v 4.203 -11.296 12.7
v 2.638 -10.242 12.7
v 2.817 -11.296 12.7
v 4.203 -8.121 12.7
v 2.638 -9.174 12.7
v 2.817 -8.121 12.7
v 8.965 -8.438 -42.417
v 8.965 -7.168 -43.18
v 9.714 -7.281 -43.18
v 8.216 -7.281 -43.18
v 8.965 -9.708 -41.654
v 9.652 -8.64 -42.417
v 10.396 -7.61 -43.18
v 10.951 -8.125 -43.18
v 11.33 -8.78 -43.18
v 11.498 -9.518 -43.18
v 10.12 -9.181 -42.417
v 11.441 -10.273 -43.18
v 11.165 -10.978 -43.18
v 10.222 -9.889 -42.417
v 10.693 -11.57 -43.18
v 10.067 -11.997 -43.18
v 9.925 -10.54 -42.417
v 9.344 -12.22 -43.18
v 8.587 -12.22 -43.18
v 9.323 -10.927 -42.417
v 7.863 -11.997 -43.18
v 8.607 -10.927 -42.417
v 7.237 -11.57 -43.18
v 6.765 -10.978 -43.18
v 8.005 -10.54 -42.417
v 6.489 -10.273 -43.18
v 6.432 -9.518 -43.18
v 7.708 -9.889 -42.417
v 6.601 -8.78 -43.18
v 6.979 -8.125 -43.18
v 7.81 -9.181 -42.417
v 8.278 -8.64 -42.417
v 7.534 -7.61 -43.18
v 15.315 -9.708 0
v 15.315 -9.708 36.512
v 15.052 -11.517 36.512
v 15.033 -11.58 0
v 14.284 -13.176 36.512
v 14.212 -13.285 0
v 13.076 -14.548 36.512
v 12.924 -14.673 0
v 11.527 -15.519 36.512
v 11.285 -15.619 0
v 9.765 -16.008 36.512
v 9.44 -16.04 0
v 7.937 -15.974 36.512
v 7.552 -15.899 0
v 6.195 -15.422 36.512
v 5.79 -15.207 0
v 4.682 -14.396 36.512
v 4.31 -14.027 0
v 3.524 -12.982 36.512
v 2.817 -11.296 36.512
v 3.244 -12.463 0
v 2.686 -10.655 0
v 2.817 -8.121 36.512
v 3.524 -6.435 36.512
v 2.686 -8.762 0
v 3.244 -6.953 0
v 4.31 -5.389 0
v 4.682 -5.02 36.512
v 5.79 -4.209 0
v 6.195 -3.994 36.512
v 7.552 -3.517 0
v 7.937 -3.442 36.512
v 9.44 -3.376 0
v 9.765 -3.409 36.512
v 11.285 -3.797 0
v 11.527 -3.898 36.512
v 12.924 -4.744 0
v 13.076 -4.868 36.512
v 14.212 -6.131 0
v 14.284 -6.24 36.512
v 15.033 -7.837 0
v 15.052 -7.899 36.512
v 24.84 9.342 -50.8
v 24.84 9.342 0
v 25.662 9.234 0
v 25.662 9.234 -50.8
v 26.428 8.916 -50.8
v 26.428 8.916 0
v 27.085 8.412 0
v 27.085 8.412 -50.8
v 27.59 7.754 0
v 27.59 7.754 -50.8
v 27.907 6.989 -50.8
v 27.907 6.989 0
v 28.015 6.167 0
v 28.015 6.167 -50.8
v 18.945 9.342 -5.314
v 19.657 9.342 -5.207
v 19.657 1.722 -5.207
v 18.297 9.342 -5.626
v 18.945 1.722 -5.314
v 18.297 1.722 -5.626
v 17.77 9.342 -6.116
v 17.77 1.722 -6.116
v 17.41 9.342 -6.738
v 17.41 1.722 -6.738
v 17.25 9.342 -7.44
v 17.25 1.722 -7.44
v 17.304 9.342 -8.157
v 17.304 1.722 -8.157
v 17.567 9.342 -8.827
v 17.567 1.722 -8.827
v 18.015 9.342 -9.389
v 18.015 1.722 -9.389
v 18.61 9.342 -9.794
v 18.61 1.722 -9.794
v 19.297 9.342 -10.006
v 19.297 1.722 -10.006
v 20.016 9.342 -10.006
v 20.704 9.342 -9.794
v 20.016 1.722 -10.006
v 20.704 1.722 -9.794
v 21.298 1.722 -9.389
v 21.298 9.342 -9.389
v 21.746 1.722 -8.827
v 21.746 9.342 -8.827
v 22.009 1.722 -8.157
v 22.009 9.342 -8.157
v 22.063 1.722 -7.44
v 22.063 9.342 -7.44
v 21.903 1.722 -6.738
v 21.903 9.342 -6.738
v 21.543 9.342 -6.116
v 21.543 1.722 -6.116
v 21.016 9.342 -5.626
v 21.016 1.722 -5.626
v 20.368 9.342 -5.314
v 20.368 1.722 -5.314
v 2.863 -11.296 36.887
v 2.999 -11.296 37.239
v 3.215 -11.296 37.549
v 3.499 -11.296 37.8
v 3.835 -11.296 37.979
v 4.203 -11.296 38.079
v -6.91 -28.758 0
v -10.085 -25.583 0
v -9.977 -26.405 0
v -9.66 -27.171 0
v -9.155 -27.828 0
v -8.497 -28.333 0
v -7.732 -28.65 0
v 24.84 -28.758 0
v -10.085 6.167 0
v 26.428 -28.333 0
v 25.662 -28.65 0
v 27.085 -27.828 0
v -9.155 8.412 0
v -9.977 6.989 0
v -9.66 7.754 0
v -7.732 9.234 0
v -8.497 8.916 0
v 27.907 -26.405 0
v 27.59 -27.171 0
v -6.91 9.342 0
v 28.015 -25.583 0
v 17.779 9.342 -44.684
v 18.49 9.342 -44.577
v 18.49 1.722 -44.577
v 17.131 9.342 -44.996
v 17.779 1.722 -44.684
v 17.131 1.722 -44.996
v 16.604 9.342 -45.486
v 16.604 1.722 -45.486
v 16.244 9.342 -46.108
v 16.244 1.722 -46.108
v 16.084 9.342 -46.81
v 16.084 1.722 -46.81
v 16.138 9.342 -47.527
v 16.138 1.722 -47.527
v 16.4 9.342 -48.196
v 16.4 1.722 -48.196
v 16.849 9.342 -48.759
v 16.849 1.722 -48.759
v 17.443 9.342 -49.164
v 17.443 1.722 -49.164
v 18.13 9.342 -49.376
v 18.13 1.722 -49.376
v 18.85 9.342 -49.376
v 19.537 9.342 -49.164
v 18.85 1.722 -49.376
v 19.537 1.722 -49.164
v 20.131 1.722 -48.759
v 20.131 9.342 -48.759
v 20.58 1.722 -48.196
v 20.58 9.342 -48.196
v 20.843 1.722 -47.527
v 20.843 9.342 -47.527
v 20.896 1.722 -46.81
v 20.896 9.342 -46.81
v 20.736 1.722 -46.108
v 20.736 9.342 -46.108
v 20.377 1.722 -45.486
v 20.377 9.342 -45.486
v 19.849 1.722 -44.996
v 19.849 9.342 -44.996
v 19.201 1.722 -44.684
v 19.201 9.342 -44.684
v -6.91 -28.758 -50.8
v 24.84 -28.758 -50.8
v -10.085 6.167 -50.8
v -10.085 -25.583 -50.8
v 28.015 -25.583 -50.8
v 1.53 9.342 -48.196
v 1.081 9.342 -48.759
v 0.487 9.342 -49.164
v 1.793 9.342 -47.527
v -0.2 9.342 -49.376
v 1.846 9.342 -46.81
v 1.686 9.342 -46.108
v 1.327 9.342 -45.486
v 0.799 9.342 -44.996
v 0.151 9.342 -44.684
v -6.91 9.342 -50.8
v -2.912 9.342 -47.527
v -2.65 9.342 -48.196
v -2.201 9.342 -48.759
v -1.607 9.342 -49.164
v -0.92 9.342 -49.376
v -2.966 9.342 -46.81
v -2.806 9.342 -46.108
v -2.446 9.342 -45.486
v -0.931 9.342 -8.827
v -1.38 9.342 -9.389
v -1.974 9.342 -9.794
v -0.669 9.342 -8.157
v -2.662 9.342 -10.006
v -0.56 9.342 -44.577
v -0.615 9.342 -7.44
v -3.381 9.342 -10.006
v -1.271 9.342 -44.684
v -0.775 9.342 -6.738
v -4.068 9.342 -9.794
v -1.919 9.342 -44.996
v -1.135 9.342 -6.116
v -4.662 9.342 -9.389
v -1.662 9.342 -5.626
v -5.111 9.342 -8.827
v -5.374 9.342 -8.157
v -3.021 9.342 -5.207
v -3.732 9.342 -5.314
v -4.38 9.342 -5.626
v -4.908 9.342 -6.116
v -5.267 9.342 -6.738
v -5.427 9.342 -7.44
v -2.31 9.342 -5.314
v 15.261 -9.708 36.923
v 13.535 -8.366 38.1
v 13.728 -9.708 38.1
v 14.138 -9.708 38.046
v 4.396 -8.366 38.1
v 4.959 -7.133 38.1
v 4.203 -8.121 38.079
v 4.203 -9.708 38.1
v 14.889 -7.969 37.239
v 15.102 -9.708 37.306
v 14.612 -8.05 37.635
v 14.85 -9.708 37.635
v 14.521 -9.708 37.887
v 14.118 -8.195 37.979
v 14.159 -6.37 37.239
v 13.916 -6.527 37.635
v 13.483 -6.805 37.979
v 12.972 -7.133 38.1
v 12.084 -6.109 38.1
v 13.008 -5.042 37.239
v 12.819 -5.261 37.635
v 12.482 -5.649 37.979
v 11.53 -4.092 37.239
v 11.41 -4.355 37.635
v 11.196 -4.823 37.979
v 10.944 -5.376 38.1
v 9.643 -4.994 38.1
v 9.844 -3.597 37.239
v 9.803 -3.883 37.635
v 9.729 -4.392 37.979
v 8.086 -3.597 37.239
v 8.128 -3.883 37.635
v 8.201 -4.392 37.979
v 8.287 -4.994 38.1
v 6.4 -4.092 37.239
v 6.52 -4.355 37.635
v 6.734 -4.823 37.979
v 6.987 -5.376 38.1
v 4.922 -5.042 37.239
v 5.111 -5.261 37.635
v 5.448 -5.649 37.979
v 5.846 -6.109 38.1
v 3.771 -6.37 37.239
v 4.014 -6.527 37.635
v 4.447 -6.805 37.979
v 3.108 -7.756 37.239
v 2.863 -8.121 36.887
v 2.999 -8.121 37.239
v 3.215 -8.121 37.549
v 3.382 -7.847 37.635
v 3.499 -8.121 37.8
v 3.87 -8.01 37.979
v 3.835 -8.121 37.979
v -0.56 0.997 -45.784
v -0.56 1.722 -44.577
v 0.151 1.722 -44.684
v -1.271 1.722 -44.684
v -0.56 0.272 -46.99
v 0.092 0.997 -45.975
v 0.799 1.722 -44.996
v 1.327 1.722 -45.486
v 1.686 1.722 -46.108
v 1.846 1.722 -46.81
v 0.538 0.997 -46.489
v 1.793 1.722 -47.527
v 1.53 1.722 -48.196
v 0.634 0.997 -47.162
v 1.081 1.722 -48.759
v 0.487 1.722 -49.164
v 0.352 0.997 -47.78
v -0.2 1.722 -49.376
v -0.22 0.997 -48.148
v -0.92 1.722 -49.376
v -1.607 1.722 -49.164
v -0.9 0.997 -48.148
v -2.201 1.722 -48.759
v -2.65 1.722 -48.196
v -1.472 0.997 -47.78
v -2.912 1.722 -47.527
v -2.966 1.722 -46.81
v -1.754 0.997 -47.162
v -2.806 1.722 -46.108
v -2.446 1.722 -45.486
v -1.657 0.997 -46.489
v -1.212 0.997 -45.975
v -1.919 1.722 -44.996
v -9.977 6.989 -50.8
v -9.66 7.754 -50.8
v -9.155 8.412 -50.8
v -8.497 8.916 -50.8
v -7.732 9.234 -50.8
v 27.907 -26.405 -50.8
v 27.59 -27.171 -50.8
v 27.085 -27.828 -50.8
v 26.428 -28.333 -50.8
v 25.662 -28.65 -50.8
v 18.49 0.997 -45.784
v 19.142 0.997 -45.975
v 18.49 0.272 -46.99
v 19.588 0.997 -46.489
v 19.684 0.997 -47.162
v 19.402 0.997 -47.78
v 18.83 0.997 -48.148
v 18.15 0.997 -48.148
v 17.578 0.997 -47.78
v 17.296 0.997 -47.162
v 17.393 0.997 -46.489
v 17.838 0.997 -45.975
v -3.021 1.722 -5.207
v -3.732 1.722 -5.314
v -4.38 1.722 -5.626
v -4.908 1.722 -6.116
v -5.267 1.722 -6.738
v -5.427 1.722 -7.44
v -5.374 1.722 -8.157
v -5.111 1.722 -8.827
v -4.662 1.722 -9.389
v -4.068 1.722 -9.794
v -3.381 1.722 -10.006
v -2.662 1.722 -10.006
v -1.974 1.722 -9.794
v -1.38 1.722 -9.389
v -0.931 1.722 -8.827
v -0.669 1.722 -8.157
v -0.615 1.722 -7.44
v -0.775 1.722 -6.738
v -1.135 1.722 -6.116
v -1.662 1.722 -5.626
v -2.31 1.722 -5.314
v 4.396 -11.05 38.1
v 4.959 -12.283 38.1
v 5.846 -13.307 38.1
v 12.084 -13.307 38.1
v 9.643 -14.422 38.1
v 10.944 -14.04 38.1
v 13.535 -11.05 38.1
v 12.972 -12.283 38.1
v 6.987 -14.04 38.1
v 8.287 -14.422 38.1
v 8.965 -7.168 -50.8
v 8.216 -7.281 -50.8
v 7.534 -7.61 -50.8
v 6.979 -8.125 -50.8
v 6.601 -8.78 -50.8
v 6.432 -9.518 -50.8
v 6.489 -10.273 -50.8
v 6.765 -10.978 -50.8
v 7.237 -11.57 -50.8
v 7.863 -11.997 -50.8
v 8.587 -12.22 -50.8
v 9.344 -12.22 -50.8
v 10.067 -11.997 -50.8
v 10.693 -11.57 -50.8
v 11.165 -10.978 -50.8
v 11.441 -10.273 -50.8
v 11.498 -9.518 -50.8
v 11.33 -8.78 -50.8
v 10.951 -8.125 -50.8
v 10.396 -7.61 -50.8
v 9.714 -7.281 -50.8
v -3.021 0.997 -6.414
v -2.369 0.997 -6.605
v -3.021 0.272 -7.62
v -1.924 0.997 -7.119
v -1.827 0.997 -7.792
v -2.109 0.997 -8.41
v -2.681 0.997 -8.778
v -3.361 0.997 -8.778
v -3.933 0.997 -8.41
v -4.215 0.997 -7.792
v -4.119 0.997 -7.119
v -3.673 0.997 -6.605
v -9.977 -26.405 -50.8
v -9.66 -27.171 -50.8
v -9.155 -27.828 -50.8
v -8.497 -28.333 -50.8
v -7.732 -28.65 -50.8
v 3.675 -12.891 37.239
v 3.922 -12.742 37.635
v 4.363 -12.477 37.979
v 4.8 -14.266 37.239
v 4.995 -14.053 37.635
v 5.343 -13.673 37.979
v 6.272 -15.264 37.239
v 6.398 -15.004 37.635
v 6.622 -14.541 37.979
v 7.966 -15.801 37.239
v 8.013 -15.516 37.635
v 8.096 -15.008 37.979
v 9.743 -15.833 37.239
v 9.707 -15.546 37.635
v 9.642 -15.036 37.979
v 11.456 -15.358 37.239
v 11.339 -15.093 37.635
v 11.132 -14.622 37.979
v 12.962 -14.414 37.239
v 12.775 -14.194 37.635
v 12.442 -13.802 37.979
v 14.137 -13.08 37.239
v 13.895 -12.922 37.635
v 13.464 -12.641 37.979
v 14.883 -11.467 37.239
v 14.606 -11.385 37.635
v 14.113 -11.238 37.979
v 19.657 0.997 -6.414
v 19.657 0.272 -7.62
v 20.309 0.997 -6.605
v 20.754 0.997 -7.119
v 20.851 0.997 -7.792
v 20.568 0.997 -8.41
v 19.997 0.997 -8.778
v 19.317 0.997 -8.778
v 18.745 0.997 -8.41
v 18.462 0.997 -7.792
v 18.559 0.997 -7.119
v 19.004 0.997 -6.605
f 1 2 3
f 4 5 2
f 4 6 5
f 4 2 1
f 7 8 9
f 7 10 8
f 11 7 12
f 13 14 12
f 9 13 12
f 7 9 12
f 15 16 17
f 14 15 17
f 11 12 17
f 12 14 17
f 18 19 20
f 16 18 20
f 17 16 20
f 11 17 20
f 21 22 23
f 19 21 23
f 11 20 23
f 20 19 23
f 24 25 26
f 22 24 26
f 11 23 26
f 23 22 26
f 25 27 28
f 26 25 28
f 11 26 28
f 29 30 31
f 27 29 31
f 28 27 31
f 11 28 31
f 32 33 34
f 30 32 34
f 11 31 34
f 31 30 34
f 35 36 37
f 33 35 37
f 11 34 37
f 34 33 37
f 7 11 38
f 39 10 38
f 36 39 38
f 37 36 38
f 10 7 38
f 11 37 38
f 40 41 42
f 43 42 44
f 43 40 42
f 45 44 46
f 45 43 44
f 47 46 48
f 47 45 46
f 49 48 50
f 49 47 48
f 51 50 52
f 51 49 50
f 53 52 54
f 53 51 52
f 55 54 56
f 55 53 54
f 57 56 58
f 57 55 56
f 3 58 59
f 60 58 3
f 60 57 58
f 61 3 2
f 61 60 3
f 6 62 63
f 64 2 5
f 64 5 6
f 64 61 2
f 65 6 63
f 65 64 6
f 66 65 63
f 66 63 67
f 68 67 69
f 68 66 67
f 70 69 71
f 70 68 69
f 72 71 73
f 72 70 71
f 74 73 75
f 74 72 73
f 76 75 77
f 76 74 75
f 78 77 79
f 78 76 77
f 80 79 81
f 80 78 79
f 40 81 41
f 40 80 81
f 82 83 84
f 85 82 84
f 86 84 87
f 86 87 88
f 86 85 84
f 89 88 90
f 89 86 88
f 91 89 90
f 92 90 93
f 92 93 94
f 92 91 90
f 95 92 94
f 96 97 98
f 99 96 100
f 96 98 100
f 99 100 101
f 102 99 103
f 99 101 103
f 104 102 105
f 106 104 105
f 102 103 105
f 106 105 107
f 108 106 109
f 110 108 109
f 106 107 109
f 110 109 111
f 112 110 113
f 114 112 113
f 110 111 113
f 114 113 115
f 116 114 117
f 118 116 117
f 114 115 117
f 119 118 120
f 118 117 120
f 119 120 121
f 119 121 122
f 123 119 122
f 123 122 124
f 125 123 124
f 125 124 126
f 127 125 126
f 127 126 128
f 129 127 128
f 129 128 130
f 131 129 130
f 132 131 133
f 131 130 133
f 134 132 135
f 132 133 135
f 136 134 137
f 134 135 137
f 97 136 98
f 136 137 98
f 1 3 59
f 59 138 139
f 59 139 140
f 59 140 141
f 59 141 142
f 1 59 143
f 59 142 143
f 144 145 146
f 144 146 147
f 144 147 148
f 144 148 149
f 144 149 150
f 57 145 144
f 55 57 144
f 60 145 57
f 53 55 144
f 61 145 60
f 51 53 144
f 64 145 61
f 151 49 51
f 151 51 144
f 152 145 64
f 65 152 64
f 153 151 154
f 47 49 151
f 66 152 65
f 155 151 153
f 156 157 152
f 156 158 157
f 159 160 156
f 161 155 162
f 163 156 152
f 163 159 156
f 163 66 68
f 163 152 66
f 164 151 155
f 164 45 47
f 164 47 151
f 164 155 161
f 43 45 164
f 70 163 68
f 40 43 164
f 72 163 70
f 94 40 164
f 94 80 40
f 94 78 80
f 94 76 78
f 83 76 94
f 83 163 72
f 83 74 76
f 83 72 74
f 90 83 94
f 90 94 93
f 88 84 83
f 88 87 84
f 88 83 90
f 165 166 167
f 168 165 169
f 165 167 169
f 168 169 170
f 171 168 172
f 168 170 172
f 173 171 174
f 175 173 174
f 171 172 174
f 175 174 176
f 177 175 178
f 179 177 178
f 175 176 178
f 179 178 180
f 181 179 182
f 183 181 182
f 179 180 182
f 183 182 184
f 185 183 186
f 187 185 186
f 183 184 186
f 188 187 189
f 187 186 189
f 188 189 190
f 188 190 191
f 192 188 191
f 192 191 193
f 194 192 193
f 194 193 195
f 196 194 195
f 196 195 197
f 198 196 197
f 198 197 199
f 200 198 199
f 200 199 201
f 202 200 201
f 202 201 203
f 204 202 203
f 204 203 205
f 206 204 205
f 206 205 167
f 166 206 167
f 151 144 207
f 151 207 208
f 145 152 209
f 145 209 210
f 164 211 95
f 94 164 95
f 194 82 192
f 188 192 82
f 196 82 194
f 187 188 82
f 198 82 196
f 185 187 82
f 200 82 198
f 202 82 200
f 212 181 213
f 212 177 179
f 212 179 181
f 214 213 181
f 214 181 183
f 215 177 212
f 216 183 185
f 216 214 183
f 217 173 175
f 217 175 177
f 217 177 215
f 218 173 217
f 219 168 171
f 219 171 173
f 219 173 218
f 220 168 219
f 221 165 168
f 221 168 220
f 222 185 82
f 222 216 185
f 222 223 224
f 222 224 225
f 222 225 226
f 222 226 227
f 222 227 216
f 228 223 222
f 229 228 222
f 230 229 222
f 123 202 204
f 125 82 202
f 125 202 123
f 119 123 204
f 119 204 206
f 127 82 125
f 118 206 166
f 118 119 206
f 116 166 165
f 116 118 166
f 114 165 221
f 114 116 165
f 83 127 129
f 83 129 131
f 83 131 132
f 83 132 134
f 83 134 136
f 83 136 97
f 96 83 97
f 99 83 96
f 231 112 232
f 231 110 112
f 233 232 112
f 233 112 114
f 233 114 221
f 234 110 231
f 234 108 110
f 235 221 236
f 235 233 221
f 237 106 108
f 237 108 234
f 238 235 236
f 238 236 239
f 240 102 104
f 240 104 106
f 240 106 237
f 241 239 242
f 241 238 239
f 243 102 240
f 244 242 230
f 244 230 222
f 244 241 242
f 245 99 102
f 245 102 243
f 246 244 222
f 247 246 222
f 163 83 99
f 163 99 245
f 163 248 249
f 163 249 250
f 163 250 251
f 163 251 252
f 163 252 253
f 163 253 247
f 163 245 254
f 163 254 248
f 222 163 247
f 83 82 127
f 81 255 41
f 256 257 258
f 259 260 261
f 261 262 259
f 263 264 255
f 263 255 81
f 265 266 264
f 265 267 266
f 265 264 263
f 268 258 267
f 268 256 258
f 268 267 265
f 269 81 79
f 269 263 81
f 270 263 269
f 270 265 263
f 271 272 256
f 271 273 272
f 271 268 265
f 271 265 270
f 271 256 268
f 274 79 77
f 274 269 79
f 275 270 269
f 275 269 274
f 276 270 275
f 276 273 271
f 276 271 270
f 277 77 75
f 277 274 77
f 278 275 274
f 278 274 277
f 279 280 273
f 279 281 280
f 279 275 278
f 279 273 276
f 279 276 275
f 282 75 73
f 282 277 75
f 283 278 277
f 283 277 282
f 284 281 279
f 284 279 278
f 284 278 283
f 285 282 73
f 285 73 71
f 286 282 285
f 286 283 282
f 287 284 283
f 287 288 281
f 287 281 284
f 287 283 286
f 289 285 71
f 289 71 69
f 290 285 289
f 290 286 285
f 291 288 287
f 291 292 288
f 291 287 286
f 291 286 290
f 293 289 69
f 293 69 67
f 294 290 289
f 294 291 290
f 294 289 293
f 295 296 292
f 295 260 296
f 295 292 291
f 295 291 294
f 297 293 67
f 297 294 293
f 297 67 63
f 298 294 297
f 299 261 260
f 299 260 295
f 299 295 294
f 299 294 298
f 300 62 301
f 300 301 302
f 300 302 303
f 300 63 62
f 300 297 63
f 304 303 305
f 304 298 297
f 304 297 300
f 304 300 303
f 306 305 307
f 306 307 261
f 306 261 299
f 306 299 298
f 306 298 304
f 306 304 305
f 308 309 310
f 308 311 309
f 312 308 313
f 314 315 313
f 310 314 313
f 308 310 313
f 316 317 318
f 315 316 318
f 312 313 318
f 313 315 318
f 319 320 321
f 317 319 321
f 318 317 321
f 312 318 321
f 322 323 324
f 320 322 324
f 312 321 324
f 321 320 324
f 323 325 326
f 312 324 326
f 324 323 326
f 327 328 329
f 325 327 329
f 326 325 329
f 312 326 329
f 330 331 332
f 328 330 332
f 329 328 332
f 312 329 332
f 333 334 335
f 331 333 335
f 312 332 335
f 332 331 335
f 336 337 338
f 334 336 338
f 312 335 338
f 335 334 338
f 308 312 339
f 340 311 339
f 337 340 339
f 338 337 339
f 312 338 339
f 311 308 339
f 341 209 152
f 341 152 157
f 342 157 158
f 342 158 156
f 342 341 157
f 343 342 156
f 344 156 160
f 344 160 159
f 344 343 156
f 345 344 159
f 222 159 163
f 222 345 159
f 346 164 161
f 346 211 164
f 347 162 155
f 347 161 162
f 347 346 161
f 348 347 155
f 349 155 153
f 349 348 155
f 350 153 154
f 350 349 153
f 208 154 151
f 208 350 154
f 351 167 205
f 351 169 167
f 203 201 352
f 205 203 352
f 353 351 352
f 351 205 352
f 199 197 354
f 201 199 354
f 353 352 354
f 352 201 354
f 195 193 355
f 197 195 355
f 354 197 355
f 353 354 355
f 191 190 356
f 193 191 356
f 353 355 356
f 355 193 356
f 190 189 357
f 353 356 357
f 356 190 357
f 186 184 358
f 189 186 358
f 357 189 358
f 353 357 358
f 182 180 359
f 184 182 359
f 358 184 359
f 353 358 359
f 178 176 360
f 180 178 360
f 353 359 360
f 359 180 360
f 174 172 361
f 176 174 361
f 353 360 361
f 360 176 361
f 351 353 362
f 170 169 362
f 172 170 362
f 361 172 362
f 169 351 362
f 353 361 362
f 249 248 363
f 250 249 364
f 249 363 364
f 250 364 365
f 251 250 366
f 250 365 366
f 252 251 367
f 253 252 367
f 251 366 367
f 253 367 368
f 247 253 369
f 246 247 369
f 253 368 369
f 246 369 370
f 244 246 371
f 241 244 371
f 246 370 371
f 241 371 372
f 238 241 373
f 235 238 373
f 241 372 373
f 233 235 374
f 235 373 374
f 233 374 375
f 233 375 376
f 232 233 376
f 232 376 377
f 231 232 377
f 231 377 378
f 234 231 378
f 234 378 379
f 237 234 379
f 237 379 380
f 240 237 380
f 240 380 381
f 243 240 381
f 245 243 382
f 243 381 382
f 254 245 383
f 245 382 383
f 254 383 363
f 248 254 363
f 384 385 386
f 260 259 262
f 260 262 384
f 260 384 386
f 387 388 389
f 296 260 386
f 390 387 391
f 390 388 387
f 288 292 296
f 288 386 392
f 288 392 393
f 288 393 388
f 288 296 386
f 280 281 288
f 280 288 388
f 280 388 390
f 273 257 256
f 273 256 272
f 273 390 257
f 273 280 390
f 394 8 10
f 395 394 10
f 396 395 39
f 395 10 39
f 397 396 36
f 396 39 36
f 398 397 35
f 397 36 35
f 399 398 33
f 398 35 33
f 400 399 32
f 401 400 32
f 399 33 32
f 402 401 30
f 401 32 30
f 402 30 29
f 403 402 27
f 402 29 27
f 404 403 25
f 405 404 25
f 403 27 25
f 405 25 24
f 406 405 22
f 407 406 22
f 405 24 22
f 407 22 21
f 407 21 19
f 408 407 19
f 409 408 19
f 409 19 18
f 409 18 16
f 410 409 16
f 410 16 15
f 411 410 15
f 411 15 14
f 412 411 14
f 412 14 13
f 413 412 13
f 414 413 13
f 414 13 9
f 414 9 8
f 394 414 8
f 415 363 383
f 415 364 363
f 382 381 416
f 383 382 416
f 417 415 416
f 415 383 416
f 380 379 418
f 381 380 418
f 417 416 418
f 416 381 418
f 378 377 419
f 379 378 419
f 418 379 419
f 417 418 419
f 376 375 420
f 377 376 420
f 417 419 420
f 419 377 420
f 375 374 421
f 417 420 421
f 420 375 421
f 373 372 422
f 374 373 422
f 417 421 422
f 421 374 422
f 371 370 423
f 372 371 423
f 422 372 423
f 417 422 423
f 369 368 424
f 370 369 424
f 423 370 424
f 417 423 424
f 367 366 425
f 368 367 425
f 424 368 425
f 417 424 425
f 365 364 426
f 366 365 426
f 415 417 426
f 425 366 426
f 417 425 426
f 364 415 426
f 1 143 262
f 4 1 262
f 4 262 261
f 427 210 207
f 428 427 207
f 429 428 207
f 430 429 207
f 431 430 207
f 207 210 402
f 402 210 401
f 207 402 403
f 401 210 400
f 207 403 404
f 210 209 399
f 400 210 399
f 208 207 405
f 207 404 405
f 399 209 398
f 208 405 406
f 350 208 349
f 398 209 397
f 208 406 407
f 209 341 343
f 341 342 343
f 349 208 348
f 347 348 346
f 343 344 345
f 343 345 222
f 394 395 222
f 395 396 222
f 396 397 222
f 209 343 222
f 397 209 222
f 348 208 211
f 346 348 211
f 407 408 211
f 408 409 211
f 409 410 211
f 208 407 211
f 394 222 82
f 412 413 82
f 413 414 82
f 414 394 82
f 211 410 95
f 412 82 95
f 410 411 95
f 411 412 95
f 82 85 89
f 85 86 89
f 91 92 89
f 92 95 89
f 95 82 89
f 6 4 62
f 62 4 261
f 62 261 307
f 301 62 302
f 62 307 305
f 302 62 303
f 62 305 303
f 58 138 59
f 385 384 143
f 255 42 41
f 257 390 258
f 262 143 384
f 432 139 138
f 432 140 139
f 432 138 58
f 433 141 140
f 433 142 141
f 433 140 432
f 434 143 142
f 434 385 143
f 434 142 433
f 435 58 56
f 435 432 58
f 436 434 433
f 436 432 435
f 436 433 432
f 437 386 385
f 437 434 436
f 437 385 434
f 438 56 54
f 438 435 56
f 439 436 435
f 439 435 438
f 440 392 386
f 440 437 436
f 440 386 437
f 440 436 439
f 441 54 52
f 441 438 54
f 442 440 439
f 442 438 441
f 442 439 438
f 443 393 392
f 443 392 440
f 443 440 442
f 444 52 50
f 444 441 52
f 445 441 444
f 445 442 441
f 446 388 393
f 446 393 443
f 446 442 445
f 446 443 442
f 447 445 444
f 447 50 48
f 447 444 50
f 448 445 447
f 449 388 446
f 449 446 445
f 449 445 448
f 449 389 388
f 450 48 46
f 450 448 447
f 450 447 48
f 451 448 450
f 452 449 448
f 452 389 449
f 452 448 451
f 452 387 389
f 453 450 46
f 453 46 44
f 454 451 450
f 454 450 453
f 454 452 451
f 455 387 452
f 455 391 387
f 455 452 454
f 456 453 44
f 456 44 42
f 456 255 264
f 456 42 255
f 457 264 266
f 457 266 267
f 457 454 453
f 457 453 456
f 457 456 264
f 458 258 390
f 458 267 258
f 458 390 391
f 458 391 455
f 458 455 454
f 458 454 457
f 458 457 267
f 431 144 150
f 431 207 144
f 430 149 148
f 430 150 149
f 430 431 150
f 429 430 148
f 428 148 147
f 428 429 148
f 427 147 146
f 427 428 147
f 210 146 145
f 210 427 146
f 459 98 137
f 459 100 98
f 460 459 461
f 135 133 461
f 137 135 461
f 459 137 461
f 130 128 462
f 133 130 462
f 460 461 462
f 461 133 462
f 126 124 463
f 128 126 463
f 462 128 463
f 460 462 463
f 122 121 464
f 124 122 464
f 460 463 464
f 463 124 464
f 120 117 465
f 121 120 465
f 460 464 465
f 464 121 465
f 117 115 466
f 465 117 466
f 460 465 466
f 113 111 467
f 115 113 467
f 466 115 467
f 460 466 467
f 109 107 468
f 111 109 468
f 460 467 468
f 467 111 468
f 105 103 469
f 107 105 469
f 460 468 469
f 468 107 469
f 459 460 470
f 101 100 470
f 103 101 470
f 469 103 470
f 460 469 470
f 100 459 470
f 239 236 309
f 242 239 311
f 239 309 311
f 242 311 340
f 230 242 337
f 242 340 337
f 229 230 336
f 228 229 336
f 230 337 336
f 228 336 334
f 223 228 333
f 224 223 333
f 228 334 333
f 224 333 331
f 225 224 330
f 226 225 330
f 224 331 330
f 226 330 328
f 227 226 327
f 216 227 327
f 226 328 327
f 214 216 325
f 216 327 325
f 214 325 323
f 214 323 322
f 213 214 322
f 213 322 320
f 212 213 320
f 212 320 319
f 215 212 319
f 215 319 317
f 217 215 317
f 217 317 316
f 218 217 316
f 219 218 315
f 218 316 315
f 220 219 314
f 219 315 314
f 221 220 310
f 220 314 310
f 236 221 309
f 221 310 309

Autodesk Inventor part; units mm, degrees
ref_plane "YZ Plane" through (0, 0, 0) normal (1, 0, 0) x (0, 1, 0)
ref_plane "XZ Plane" through (0, 0, 0) normal (0, 1, 0) x (-1, 0, 0)
ref_plane "XY Plane" through (0, 0, 0) normal (0, 0, 1) x (1, 0, 0)
sketch "Sketch1" plane through (0, 0, 0) normal (0, 0, 1) x (1, 0, 0)
  line L0 (-10.0849, -28.7582) -> (28.0151, -28.7582)
  line L1 (28.0151, -28.7582) -> (28.0151, 9.3418)
  line L2 (28.0151, 9.3418) -> (-10.0849, 9.3418)
  line L3 (-10.0849, 9.3418) -> (-10.0849, -28.7582)
  circle A0 centre (8.9651, -9.7082) radius 6.35
  point P0 (0, 0)
  point P1 (8.9651, 9.3418)
  point P2 (-10.0849, -9.7082)
  dimension "d0" = 38.1
  dimension "d1" = 38.1
  dimension "d4" = 12.7
extrude "Extrusion1" add sketch "Sketch1" against normal blind 50.8 contours L3 L2 L1 L0 | A0
extrude "Extrusion2" add sketch "Sketch1" along normal blind 38.1 contours A0
fillet "Fillet1" radius 1.5875 1 edges at (2.6151, -9.7082, 38.1)
fillet "Fillet2" radius 3.175 4 edges at (28.0151, 9.3418, -25.4) (-10.0849, 9.3418, -25.4) (28.0151, -28.7582, -25.4) (-10.0849, -28.7582, -25.4)
sketch "Sketch2" plane through (8.9651, -9.7082, 38.1) normal (0, 0, 1) x (1, 0, 0)
  circle A0 centre (0, 0) radius 4.7625 projected
  line L0 (-4.7625, -1.5875) -> (-4.7625, 1.5875)
  line L1 (-4.7625, 1.5875) -> (-7.9375, 1.5875)
  line L2 (-7.9375, 1.5875) -> (-7.9375, -1.5875)
  line L3 (-7.9375, -1.5875) -> (-4.7625, -1.5875)
  point P0 (-8.9651, 9.7082)
  dimension "d13" = 3.175
  dimension "d14" = 1.5875
  dimension "d15" = 3.175
extrude "Extrusion3" cut sketch "Sketch2" against normal blind 25.4 contours L0 L3 L2 L1
sketch "Sketch3" plane through (-6.9099, 9.3418, 0) normal (0, 1, 0) x (1, 0, 0)
  line L0 (31.75, 0) -> (0, 0) projected
  line L1 (31.75, 50.8) -> (0, 50.8) projected
  line L2 (-3.175, 50.8) -> (-3.175, 0) projected
  point P0 (6.9099, 0)
  point P1 (26.5665, 7.62)
  point P2 (25.4, 46.99)
  point P3 (6.35, 46.99)
  point P4 (3.8887, 7.62)
  point P5 (34.925, 50.8)
  dimension "d18" = 7.62
  dimension "d19" = 7.62
  dimension "d20" = 3.81
  dimension "d21" = 3.81
  dimension "d22" = 9.525
  dimension "d23" = 9.525
hole "Hole1" at (19.6566, 9.3418, -7.62) at (18.4901, 9.3418, -46.99) at (-0.5599, 9.3418, -46.99) at (-3.0212, 9.3418, -7.62) direction (0, -1, 0) diameter 4.826 depth 7.62 tip angle 118
thread "Thread1" size "10-32 UNF" class "2B" standard "ANSI Unified Screw Threads" full length
thread "Thread2" size "10-24 UNC" class "2B" standard "ANSI Unified Screw Threads" full length
thread "Thread3" size "10-24 UNC" class "2B" standard "ANSI Unified Screw Threads" full length
thread "Thread4" size "10-24 UNC" class "2B" standard "ANSI Unified Screw Threads" full length
sketch "Sketch4" plane through (0, 0, -50.8) normal (0, 0, -1) x (-1, 0, 0)
  point P0 (0, 0)
  point P1 (-8.9651, -9.7082)
hole "Hole2" at (8.9651, -9.7082, -50.8) direction (0, 0, 1) diameter 5.08 depth 7.62 tip angle 118
properties part number "p60 gearbox proxy"
